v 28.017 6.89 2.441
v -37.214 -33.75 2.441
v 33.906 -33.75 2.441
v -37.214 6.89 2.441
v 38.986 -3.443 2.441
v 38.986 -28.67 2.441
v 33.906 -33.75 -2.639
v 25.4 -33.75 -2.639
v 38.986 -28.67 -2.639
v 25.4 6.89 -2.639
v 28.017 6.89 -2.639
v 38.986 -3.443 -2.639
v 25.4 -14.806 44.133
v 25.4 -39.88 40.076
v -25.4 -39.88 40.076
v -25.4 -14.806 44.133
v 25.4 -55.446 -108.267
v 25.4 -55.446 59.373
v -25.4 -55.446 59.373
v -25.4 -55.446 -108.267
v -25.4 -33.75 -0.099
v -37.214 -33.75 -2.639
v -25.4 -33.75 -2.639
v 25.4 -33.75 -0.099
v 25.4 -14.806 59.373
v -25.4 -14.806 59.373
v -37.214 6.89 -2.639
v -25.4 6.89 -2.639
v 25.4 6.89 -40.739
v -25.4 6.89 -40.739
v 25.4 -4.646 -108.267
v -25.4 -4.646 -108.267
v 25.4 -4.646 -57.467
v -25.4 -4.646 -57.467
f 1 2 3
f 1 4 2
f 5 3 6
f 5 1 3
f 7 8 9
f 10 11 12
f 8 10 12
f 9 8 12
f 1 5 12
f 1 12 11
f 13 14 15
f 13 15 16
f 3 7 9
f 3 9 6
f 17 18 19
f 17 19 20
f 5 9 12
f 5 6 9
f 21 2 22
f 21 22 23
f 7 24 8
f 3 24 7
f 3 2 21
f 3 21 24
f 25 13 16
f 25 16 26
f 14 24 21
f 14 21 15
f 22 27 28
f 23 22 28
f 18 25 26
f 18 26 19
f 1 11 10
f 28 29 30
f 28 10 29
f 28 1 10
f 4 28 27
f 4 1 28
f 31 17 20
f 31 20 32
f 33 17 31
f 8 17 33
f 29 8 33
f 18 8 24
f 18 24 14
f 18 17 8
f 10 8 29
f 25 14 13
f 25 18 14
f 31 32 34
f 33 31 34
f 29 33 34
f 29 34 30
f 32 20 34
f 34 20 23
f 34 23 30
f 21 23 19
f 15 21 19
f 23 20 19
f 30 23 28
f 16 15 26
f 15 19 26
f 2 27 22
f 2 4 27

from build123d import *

# Parameters (mm, degrees)
F1_DEPTH = 25.4
F3_DEPTH = 2.54
F4_SIZE  = 5.08
F5_DEPTH = 25.4


with BuildPart() as f1:
    # F0 (on Right) → F1 (new body, symmetric)
    with BuildSketch(Plane.YZ):
        Polygon((-14.806319427, 59.3731885201), (-55.446319427, 59.3731885201), (-55.446319427, -108.2668114799), (-4.646319427, -108.2668114799), (-4.646319427, -57.4668114799), (6.8900182168, -40.7391304162), (6.8900182168, -0.0991304162), (-33.7499817832, -0.0991304162), (-39.8801730554, 40.0758662231), (-14.806319427, 44.1331885201), align=None)
    extrude(amount=F1_DEPTH, both=True)

    # F2 (on face) → F3 (join, symmetric)
    with BuildSketch(Plane.XY.offset(-0.0991304162)):
        Polygon((-37.2138172336, -33.7499817832), (38.9861827664, -33.7499817832), (38.9861827664, -3.4425283198), (28.0170366168, 6.8900182168), (-37.2138172336, 6.8900182168), align=None)
    extrude(amount=F3_DEPTH, both=True)

    # F4
    f4_edges = [f1.edges().sort_by_distance(p)[0] for p in [
        (38.986183, -33.749982, -0.09913),
    ]]
    chamfer(f4_edges, length=F4_SIZE)

    # F0 (on Right) → F5 (join)
    with BuildSketch(Plane.YZ):
        Polygon((-14.806319427, 59.3731885201), (-55.446319427, 59.3731885201), (-55.446319427, -108.2668114799), (-4.646319427, -108.2668114799), (-4.646319427, -57.4668114799), (6.8900182168, -40.7391304162), (6.8900182168, -0.0991304162), (-33.7499817832, -0.0991304162), (-39.8801730554, 40.0758662231), (-14.806319427, 44.1331885201), align=None)
    extrude(amount=F5_DEPTH)


solid = f1.part
